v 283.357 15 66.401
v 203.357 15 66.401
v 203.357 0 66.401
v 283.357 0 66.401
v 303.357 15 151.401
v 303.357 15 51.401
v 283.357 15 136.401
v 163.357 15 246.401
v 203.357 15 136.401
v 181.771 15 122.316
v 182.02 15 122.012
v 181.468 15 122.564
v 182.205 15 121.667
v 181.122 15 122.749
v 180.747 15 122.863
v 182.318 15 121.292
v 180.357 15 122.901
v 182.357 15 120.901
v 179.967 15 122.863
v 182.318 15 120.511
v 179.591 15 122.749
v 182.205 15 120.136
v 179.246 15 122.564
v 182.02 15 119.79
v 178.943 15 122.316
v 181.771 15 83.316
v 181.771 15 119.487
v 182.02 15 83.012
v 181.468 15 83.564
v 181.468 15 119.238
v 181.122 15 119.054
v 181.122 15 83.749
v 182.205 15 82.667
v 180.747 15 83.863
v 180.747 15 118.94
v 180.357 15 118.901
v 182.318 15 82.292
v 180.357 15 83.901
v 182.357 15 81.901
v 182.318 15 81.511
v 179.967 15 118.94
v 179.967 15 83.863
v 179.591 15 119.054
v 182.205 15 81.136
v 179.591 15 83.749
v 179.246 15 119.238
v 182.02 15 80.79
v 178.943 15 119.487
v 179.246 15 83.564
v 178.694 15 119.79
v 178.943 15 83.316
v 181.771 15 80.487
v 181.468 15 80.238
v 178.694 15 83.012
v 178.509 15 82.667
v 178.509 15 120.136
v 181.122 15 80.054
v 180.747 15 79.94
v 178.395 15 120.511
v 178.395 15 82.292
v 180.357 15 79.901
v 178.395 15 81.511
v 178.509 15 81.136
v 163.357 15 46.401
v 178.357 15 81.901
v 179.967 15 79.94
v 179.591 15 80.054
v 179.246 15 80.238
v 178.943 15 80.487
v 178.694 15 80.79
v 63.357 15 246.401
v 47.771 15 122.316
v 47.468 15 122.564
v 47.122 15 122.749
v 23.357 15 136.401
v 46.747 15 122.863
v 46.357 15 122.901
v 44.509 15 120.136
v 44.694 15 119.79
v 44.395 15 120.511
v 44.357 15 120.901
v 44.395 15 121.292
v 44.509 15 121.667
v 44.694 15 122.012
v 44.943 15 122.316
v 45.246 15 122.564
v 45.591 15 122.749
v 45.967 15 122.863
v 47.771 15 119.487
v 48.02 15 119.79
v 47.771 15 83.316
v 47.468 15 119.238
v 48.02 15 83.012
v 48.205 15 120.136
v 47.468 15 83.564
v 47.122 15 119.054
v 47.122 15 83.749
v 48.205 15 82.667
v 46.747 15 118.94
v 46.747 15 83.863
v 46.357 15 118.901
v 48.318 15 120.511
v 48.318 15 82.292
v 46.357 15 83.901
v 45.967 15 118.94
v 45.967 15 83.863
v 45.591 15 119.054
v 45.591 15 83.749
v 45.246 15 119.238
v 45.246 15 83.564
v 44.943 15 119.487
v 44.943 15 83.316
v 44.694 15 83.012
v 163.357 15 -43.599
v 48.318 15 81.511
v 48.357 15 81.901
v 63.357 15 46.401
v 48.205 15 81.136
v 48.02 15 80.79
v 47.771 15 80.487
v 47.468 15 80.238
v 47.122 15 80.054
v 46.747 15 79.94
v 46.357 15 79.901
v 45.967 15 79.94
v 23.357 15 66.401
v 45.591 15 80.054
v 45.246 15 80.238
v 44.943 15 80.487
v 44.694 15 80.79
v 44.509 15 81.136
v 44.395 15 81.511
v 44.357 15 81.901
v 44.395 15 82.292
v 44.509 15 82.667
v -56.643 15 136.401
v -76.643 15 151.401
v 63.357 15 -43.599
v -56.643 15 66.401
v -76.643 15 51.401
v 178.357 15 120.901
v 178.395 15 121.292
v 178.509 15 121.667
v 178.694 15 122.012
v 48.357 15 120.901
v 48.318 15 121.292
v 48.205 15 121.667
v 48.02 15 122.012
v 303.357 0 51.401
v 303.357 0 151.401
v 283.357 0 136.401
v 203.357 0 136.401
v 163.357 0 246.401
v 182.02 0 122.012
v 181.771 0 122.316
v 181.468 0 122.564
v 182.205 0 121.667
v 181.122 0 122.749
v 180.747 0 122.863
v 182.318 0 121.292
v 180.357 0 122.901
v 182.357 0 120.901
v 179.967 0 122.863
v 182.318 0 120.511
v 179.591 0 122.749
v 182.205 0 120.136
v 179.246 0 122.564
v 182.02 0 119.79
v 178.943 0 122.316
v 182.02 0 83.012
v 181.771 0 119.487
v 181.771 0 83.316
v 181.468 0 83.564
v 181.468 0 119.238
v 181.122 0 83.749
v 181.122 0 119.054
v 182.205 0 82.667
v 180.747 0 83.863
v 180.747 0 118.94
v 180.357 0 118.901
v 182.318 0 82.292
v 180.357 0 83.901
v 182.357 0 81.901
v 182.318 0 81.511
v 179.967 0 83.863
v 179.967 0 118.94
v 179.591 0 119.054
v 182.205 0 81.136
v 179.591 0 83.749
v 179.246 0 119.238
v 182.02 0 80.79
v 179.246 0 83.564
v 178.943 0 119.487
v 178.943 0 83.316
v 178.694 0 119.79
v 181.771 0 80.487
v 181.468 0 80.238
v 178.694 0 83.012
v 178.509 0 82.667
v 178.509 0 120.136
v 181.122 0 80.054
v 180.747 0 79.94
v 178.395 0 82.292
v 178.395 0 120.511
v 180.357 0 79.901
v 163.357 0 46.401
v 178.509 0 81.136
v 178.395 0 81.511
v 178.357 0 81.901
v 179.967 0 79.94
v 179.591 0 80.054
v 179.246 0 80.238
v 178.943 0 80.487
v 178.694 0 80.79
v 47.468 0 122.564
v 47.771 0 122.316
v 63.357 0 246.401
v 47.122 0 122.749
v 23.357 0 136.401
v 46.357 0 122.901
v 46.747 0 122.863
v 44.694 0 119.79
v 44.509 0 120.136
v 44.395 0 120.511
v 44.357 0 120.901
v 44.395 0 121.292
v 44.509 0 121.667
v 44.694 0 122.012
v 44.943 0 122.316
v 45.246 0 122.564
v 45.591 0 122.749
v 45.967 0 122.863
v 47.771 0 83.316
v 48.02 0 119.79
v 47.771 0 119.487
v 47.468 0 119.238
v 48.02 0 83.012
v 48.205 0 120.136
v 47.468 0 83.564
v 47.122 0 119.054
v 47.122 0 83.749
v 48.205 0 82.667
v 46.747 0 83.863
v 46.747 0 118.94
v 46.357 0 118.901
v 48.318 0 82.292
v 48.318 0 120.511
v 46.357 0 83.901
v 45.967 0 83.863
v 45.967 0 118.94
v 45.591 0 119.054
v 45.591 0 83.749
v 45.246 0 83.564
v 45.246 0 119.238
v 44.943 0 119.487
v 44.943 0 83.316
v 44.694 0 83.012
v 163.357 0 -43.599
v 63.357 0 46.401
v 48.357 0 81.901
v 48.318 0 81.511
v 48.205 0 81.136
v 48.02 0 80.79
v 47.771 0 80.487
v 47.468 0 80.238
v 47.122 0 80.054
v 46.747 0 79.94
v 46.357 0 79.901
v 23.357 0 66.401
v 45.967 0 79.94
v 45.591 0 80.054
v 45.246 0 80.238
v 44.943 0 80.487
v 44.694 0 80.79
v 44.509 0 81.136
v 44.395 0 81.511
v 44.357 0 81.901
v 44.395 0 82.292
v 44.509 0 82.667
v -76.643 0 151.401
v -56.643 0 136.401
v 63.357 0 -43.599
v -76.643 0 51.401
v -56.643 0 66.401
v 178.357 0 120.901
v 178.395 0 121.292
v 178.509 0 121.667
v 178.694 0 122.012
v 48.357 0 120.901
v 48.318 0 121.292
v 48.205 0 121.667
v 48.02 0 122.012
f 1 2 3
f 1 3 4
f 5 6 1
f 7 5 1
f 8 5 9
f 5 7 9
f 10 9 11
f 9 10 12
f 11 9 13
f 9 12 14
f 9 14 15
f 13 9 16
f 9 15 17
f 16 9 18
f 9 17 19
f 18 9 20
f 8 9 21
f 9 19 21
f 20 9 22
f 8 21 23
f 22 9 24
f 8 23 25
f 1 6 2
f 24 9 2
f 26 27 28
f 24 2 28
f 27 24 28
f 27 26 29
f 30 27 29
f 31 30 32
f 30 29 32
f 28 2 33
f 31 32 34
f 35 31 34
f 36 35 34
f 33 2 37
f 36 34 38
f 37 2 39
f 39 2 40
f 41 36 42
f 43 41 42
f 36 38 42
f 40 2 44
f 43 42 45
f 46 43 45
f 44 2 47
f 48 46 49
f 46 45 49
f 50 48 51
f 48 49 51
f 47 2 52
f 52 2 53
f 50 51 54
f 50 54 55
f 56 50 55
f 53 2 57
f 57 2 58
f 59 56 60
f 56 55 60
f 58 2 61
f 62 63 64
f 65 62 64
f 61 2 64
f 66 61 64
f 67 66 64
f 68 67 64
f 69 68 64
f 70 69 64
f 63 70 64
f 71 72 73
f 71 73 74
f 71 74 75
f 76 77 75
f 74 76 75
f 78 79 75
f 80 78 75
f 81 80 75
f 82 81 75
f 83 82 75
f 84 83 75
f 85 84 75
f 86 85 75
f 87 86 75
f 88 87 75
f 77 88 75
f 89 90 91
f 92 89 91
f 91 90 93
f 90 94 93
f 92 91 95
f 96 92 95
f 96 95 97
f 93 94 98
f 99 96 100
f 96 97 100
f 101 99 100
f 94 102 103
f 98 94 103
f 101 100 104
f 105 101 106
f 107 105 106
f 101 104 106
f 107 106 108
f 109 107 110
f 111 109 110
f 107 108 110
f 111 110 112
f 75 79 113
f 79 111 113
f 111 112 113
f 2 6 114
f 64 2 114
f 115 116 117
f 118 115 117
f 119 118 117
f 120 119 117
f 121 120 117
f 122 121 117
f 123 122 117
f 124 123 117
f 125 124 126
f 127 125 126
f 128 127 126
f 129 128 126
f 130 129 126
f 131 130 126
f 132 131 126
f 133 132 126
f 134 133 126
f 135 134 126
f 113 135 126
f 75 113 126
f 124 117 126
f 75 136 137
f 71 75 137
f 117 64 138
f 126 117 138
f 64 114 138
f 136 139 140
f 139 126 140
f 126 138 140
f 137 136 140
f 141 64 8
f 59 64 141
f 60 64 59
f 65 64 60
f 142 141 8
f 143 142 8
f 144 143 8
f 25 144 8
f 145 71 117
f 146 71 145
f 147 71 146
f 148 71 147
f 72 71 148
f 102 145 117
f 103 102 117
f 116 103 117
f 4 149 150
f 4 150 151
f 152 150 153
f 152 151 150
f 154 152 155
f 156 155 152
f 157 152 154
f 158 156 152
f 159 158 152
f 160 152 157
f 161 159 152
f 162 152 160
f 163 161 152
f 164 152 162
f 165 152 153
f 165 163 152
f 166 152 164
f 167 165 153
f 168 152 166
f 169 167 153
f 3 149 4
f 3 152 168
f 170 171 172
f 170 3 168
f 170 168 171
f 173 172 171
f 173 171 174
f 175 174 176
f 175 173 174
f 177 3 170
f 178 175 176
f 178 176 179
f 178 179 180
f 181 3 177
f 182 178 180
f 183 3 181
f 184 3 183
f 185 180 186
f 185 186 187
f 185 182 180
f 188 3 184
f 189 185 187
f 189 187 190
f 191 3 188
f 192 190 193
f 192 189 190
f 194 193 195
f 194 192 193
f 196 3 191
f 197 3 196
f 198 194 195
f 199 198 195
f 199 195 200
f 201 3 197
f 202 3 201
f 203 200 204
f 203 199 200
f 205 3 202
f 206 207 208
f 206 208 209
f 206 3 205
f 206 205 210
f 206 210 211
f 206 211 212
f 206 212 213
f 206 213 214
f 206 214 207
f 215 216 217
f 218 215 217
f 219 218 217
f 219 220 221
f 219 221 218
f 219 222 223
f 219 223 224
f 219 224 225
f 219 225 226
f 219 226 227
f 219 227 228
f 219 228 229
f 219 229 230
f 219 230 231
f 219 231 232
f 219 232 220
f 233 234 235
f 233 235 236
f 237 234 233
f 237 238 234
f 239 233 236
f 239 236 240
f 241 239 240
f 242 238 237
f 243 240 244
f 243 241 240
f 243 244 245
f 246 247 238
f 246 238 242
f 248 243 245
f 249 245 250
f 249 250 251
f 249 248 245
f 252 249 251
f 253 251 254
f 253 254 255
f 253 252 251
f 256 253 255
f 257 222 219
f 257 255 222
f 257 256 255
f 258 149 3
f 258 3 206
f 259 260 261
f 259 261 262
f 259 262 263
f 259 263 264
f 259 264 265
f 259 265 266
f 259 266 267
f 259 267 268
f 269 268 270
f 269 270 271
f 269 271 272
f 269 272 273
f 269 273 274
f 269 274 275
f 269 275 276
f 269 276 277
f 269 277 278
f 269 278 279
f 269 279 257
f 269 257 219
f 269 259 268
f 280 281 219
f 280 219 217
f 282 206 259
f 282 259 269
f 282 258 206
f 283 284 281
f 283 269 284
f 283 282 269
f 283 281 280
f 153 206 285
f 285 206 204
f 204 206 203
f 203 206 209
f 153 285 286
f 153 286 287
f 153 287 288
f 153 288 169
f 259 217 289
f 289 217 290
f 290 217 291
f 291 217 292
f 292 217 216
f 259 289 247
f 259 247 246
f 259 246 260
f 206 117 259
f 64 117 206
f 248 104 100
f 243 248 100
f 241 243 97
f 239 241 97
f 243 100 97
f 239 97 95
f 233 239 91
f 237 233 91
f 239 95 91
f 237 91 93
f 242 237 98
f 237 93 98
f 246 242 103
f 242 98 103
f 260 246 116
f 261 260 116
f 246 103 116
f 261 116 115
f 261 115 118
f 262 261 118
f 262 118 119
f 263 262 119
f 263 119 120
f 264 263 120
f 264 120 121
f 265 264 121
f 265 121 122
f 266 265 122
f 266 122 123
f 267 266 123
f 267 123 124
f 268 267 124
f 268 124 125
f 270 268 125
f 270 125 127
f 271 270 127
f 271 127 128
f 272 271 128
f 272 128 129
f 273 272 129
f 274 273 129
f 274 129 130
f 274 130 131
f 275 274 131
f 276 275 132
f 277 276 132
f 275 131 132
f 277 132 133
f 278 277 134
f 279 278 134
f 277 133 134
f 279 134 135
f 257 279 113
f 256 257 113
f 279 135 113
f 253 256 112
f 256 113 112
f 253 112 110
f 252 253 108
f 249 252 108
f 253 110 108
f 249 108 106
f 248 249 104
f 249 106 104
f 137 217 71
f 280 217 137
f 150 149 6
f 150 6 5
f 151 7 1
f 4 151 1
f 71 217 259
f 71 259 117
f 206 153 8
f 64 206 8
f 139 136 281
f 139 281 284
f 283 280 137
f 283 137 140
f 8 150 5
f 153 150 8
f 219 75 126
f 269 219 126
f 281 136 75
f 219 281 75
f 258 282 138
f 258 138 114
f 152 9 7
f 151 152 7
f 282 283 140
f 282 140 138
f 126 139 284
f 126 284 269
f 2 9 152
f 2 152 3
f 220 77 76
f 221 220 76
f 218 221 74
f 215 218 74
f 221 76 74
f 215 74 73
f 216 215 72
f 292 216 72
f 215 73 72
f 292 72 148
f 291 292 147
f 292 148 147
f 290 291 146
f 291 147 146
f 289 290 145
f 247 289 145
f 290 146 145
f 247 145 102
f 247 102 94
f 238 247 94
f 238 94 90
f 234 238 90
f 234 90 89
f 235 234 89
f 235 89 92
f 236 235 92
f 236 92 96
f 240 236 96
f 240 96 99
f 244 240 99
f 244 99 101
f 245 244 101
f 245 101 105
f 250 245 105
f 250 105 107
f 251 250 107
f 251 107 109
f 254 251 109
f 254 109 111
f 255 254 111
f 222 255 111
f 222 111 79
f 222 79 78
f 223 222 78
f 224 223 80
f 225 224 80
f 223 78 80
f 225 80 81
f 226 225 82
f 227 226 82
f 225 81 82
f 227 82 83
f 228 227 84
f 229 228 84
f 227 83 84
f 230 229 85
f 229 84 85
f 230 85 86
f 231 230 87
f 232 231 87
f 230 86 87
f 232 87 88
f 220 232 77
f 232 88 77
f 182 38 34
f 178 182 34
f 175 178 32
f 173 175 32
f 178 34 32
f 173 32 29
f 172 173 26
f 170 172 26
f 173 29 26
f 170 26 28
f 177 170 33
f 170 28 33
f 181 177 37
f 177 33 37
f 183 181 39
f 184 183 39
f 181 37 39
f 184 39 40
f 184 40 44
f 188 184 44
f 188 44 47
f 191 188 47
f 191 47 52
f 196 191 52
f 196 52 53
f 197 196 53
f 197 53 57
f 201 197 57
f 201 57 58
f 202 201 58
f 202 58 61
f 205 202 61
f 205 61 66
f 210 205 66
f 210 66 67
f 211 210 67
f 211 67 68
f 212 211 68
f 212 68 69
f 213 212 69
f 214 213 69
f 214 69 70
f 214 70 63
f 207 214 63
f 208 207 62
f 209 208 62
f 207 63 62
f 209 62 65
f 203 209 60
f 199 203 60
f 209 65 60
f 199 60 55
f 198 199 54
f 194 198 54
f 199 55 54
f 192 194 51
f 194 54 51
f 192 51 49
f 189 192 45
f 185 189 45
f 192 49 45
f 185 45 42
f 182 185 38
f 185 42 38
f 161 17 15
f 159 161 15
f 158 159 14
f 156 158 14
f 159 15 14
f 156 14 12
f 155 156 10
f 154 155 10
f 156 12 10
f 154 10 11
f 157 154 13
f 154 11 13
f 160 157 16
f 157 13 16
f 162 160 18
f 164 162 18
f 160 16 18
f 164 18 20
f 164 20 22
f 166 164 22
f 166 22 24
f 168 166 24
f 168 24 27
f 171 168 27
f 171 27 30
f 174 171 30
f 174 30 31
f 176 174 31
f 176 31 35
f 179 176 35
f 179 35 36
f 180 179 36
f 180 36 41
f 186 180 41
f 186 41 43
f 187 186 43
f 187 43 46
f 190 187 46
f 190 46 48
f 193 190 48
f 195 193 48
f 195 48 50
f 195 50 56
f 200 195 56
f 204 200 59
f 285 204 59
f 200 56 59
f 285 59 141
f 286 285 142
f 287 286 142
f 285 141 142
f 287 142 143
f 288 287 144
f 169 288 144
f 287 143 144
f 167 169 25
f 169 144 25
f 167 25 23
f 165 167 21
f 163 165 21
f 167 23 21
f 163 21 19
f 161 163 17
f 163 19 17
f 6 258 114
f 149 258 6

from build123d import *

# Parameters (mm, degrees)
BOSS_EXTRU_1_DEPTH      = 15
ESQUISSE6_W             = 100
ESQUISSE6_H             = 15
ENL_V_MAT_EXTRU_1_DEPTH = 200
ENL_V_MAT_EXTRU_2_REACH = 393.106
ESQUISSE7_W             = 80
ESQUISSE7_H             = 70
ENL_V_MAT_EXTRU_4_REACH = 393.106
ESQUISSE8_R             = 2


with BuildPart() as part:
    # Esquisse1 → Boss.-Extru.1 (new body)
    with BuildSketch(Plane(origin=(0, 0, 0), x_dir=(1, 0, 0), z_dir=(0, 1, 0))):
        Polygon((-76.643189126, -51.401333399), (63.356810874, 43.598666601), (163.356810874, 43.598666601), (303.356810874, -51.401333399), (303.356810874, -151.401333399), (163.356810874, -246.401333399), (63.356810874, -246.401333399), (-76.643189126, -151.401333399), align=None)
    extrude(amount=BOSS_EXTRU_1_DEPTH)

    # Esquisse6 → Enlèv. mat.-Extru.1 (cut)
    with BuildSketch(Plane.XY.offset(246.401333399)):
        with Locations((113.356810874, 7.5)):
            Rectangle(ESQUISSE6_W, ESQUISSE6_H)
    extrude(amount=-ENL_V_MAT_EXTRU_1_DEPTH, mode=Mode.SUBTRACT)

    # Esquisse7 → Enlèv. mat.-Extru.2 (cut, up to next)
    with BuildSketch(Plane(origin=(0, 15, 0), x_dir=(1, 0, 0), z_dir=(0, 1, 0)), mode=Mode.PRIVATE) as enl_v_mat_extru_2_sk1:
        with Locations((-16.643189126, -101.401333399)):
            Rectangle(ESQUISSE7_W, ESQUISSE7_H)
    enl_v_mat_extru_2_tool1 = extrude(enl_v_mat_extru_2_sk1.sketch, amount=-ENL_V_MAT_EXTRU_2_REACH, mode=Mode.PRIVATE) & part.part
    # Esquisse7 → Enlèv. mat.-Extru.2 (cut, up to next)
    with BuildSketch(Plane(origin=(0, 15, 0), x_dir=(1, 0, 0), z_dir=(0, 1, 0)), mode=Mode.PRIVATE) as enl_v_mat_extru_2_sk2:
        with Locations((243.356810874, -101.401333399)):
            Rectangle(ESQUISSE7_W, ESQUISSE7_H)
    enl_v_mat_extru_2_tool2 = extrude(enl_v_mat_extru_2_sk2.sketch, amount=-ENL_V_MAT_EXTRU_2_REACH, mode=Mode.PRIVATE) & part.part
    add(enl_v_mat_extru_2_tool1.solids().sort_by_distance((-16.643189, 15, 101.401333))[0], mode=Mode.SUBTRACT)
    add(enl_v_mat_extru_2_tool2.solids().sort_by_distance((243.356811, 15, 101.401333))[0], mode=Mode.SUBTRACT)

    # Esquisse8 → Enlèv. mat.-Extru.4 (cut, up to next)
    with BuildSketch(Plane(origin=(0, 15, 0), x_dir=(1, 0, 0), z_dir=(0, 1, 0)), mode=Mode.PRIVATE) as enl_v_mat_extru_4_sk1:
        with Locations(Location((180.356810874, -120.901333399, 0), (0, 0, 270))):
            Circle(ESQUISSE8_R)
    enl_v_mat_extru_4_tool1 = extrude(enl_v_mat_extru_4_sk1.sketch, amount=-ENL_V_MAT_EXTRU_4_REACH, mode=Mode.PRIVATE) & part.part
    # Esquisse8 → Enlèv. mat.-Extru.4 (cut, up to next)
    with BuildSketch(Plane(origin=(0, 15, 0), x_dir=(1, 0, 0), z_dir=(0, 1, 0)), mode=Mode.PRIVATE) as enl_v_mat_extru_4_sk2:
        with Locations(Location((180.356810874, -81.901333399, 0), (0, 0, 270))):
            Circle(ESQUISSE8_R)
    enl_v_mat_extru_4_tool2 = extrude(enl_v_mat_extru_4_sk2.sketch, amount=-ENL_V_MAT_EXTRU_4_REACH, mode=Mode.PRIVATE) & part.part
    # Esquisse8 → Enlèv. mat.-Extru.4 (cut, up to next)
    with BuildSketch(Plane(origin=(0, 15, 0), x_dir=(1, 0, 0), z_dir=(0, 1, 0)), mode=Mode.PRIVATE) as enl_v_mat_extru_4_sk3:
        with Locations(Location((46.356810874, -120.901333399, 0), (0, 0, 270))):
            Circle(ESQUISSE8_R)
    enl_v_mat_extru_4_tool3 = extrude(enl_v_mat_extru_4_sk3.sketch, amount=-ENL_V_MAT_EXTRU_4_REACH, mode=Mode.PRIVATE) & part.part
    # Esquisse8 → Enlèv. mat.-Extru.4 (cut, up to next)
    with BuildSketch(Plane(origin=(0, 15, 0), x_dir=(1, 0, 0), z_dir=(0, 1, 0)), mode=Mode.PRIVATE) as enl_v_mat_extru_4_sk4:
        with Locations(Location((46.356810874, -81.901333399, 0), (0, 0, 270))):
            Circle(ESQUISSE8_R)
    enl_v_mat_extru_4_tool4 = extrude(enl_v_mat_extru_4_sk4.sketch, amount=-ENL_V_MAT_EXTRU_4_REACH, mode=Mode.PRIVATE) & part.part
    add(enl_v_mat_extru_4_tool1.solids().sort_by_distance((180.356811, 15, 120.901333))[0], mode=Mode.SUBTRACT)
    add(enl_v_mat_extru_4_tool2.solids().sort_by_distance((180.356811, 15, 81.901333))[0], mode=Mode.SUBTRACT)
    add(enl_v_mat_extru_4_tool3.solids().sort_by_distance((46.356811, 15, 120.901333))[0], mode=Mode.SUBTRACT)
    add(enl_v_mat_extru_4_tool4.solids().sort_by_distance((46.356811, 15, 81.901333))[0], mode=Mode.SUBTRACT)


solid = part.part
